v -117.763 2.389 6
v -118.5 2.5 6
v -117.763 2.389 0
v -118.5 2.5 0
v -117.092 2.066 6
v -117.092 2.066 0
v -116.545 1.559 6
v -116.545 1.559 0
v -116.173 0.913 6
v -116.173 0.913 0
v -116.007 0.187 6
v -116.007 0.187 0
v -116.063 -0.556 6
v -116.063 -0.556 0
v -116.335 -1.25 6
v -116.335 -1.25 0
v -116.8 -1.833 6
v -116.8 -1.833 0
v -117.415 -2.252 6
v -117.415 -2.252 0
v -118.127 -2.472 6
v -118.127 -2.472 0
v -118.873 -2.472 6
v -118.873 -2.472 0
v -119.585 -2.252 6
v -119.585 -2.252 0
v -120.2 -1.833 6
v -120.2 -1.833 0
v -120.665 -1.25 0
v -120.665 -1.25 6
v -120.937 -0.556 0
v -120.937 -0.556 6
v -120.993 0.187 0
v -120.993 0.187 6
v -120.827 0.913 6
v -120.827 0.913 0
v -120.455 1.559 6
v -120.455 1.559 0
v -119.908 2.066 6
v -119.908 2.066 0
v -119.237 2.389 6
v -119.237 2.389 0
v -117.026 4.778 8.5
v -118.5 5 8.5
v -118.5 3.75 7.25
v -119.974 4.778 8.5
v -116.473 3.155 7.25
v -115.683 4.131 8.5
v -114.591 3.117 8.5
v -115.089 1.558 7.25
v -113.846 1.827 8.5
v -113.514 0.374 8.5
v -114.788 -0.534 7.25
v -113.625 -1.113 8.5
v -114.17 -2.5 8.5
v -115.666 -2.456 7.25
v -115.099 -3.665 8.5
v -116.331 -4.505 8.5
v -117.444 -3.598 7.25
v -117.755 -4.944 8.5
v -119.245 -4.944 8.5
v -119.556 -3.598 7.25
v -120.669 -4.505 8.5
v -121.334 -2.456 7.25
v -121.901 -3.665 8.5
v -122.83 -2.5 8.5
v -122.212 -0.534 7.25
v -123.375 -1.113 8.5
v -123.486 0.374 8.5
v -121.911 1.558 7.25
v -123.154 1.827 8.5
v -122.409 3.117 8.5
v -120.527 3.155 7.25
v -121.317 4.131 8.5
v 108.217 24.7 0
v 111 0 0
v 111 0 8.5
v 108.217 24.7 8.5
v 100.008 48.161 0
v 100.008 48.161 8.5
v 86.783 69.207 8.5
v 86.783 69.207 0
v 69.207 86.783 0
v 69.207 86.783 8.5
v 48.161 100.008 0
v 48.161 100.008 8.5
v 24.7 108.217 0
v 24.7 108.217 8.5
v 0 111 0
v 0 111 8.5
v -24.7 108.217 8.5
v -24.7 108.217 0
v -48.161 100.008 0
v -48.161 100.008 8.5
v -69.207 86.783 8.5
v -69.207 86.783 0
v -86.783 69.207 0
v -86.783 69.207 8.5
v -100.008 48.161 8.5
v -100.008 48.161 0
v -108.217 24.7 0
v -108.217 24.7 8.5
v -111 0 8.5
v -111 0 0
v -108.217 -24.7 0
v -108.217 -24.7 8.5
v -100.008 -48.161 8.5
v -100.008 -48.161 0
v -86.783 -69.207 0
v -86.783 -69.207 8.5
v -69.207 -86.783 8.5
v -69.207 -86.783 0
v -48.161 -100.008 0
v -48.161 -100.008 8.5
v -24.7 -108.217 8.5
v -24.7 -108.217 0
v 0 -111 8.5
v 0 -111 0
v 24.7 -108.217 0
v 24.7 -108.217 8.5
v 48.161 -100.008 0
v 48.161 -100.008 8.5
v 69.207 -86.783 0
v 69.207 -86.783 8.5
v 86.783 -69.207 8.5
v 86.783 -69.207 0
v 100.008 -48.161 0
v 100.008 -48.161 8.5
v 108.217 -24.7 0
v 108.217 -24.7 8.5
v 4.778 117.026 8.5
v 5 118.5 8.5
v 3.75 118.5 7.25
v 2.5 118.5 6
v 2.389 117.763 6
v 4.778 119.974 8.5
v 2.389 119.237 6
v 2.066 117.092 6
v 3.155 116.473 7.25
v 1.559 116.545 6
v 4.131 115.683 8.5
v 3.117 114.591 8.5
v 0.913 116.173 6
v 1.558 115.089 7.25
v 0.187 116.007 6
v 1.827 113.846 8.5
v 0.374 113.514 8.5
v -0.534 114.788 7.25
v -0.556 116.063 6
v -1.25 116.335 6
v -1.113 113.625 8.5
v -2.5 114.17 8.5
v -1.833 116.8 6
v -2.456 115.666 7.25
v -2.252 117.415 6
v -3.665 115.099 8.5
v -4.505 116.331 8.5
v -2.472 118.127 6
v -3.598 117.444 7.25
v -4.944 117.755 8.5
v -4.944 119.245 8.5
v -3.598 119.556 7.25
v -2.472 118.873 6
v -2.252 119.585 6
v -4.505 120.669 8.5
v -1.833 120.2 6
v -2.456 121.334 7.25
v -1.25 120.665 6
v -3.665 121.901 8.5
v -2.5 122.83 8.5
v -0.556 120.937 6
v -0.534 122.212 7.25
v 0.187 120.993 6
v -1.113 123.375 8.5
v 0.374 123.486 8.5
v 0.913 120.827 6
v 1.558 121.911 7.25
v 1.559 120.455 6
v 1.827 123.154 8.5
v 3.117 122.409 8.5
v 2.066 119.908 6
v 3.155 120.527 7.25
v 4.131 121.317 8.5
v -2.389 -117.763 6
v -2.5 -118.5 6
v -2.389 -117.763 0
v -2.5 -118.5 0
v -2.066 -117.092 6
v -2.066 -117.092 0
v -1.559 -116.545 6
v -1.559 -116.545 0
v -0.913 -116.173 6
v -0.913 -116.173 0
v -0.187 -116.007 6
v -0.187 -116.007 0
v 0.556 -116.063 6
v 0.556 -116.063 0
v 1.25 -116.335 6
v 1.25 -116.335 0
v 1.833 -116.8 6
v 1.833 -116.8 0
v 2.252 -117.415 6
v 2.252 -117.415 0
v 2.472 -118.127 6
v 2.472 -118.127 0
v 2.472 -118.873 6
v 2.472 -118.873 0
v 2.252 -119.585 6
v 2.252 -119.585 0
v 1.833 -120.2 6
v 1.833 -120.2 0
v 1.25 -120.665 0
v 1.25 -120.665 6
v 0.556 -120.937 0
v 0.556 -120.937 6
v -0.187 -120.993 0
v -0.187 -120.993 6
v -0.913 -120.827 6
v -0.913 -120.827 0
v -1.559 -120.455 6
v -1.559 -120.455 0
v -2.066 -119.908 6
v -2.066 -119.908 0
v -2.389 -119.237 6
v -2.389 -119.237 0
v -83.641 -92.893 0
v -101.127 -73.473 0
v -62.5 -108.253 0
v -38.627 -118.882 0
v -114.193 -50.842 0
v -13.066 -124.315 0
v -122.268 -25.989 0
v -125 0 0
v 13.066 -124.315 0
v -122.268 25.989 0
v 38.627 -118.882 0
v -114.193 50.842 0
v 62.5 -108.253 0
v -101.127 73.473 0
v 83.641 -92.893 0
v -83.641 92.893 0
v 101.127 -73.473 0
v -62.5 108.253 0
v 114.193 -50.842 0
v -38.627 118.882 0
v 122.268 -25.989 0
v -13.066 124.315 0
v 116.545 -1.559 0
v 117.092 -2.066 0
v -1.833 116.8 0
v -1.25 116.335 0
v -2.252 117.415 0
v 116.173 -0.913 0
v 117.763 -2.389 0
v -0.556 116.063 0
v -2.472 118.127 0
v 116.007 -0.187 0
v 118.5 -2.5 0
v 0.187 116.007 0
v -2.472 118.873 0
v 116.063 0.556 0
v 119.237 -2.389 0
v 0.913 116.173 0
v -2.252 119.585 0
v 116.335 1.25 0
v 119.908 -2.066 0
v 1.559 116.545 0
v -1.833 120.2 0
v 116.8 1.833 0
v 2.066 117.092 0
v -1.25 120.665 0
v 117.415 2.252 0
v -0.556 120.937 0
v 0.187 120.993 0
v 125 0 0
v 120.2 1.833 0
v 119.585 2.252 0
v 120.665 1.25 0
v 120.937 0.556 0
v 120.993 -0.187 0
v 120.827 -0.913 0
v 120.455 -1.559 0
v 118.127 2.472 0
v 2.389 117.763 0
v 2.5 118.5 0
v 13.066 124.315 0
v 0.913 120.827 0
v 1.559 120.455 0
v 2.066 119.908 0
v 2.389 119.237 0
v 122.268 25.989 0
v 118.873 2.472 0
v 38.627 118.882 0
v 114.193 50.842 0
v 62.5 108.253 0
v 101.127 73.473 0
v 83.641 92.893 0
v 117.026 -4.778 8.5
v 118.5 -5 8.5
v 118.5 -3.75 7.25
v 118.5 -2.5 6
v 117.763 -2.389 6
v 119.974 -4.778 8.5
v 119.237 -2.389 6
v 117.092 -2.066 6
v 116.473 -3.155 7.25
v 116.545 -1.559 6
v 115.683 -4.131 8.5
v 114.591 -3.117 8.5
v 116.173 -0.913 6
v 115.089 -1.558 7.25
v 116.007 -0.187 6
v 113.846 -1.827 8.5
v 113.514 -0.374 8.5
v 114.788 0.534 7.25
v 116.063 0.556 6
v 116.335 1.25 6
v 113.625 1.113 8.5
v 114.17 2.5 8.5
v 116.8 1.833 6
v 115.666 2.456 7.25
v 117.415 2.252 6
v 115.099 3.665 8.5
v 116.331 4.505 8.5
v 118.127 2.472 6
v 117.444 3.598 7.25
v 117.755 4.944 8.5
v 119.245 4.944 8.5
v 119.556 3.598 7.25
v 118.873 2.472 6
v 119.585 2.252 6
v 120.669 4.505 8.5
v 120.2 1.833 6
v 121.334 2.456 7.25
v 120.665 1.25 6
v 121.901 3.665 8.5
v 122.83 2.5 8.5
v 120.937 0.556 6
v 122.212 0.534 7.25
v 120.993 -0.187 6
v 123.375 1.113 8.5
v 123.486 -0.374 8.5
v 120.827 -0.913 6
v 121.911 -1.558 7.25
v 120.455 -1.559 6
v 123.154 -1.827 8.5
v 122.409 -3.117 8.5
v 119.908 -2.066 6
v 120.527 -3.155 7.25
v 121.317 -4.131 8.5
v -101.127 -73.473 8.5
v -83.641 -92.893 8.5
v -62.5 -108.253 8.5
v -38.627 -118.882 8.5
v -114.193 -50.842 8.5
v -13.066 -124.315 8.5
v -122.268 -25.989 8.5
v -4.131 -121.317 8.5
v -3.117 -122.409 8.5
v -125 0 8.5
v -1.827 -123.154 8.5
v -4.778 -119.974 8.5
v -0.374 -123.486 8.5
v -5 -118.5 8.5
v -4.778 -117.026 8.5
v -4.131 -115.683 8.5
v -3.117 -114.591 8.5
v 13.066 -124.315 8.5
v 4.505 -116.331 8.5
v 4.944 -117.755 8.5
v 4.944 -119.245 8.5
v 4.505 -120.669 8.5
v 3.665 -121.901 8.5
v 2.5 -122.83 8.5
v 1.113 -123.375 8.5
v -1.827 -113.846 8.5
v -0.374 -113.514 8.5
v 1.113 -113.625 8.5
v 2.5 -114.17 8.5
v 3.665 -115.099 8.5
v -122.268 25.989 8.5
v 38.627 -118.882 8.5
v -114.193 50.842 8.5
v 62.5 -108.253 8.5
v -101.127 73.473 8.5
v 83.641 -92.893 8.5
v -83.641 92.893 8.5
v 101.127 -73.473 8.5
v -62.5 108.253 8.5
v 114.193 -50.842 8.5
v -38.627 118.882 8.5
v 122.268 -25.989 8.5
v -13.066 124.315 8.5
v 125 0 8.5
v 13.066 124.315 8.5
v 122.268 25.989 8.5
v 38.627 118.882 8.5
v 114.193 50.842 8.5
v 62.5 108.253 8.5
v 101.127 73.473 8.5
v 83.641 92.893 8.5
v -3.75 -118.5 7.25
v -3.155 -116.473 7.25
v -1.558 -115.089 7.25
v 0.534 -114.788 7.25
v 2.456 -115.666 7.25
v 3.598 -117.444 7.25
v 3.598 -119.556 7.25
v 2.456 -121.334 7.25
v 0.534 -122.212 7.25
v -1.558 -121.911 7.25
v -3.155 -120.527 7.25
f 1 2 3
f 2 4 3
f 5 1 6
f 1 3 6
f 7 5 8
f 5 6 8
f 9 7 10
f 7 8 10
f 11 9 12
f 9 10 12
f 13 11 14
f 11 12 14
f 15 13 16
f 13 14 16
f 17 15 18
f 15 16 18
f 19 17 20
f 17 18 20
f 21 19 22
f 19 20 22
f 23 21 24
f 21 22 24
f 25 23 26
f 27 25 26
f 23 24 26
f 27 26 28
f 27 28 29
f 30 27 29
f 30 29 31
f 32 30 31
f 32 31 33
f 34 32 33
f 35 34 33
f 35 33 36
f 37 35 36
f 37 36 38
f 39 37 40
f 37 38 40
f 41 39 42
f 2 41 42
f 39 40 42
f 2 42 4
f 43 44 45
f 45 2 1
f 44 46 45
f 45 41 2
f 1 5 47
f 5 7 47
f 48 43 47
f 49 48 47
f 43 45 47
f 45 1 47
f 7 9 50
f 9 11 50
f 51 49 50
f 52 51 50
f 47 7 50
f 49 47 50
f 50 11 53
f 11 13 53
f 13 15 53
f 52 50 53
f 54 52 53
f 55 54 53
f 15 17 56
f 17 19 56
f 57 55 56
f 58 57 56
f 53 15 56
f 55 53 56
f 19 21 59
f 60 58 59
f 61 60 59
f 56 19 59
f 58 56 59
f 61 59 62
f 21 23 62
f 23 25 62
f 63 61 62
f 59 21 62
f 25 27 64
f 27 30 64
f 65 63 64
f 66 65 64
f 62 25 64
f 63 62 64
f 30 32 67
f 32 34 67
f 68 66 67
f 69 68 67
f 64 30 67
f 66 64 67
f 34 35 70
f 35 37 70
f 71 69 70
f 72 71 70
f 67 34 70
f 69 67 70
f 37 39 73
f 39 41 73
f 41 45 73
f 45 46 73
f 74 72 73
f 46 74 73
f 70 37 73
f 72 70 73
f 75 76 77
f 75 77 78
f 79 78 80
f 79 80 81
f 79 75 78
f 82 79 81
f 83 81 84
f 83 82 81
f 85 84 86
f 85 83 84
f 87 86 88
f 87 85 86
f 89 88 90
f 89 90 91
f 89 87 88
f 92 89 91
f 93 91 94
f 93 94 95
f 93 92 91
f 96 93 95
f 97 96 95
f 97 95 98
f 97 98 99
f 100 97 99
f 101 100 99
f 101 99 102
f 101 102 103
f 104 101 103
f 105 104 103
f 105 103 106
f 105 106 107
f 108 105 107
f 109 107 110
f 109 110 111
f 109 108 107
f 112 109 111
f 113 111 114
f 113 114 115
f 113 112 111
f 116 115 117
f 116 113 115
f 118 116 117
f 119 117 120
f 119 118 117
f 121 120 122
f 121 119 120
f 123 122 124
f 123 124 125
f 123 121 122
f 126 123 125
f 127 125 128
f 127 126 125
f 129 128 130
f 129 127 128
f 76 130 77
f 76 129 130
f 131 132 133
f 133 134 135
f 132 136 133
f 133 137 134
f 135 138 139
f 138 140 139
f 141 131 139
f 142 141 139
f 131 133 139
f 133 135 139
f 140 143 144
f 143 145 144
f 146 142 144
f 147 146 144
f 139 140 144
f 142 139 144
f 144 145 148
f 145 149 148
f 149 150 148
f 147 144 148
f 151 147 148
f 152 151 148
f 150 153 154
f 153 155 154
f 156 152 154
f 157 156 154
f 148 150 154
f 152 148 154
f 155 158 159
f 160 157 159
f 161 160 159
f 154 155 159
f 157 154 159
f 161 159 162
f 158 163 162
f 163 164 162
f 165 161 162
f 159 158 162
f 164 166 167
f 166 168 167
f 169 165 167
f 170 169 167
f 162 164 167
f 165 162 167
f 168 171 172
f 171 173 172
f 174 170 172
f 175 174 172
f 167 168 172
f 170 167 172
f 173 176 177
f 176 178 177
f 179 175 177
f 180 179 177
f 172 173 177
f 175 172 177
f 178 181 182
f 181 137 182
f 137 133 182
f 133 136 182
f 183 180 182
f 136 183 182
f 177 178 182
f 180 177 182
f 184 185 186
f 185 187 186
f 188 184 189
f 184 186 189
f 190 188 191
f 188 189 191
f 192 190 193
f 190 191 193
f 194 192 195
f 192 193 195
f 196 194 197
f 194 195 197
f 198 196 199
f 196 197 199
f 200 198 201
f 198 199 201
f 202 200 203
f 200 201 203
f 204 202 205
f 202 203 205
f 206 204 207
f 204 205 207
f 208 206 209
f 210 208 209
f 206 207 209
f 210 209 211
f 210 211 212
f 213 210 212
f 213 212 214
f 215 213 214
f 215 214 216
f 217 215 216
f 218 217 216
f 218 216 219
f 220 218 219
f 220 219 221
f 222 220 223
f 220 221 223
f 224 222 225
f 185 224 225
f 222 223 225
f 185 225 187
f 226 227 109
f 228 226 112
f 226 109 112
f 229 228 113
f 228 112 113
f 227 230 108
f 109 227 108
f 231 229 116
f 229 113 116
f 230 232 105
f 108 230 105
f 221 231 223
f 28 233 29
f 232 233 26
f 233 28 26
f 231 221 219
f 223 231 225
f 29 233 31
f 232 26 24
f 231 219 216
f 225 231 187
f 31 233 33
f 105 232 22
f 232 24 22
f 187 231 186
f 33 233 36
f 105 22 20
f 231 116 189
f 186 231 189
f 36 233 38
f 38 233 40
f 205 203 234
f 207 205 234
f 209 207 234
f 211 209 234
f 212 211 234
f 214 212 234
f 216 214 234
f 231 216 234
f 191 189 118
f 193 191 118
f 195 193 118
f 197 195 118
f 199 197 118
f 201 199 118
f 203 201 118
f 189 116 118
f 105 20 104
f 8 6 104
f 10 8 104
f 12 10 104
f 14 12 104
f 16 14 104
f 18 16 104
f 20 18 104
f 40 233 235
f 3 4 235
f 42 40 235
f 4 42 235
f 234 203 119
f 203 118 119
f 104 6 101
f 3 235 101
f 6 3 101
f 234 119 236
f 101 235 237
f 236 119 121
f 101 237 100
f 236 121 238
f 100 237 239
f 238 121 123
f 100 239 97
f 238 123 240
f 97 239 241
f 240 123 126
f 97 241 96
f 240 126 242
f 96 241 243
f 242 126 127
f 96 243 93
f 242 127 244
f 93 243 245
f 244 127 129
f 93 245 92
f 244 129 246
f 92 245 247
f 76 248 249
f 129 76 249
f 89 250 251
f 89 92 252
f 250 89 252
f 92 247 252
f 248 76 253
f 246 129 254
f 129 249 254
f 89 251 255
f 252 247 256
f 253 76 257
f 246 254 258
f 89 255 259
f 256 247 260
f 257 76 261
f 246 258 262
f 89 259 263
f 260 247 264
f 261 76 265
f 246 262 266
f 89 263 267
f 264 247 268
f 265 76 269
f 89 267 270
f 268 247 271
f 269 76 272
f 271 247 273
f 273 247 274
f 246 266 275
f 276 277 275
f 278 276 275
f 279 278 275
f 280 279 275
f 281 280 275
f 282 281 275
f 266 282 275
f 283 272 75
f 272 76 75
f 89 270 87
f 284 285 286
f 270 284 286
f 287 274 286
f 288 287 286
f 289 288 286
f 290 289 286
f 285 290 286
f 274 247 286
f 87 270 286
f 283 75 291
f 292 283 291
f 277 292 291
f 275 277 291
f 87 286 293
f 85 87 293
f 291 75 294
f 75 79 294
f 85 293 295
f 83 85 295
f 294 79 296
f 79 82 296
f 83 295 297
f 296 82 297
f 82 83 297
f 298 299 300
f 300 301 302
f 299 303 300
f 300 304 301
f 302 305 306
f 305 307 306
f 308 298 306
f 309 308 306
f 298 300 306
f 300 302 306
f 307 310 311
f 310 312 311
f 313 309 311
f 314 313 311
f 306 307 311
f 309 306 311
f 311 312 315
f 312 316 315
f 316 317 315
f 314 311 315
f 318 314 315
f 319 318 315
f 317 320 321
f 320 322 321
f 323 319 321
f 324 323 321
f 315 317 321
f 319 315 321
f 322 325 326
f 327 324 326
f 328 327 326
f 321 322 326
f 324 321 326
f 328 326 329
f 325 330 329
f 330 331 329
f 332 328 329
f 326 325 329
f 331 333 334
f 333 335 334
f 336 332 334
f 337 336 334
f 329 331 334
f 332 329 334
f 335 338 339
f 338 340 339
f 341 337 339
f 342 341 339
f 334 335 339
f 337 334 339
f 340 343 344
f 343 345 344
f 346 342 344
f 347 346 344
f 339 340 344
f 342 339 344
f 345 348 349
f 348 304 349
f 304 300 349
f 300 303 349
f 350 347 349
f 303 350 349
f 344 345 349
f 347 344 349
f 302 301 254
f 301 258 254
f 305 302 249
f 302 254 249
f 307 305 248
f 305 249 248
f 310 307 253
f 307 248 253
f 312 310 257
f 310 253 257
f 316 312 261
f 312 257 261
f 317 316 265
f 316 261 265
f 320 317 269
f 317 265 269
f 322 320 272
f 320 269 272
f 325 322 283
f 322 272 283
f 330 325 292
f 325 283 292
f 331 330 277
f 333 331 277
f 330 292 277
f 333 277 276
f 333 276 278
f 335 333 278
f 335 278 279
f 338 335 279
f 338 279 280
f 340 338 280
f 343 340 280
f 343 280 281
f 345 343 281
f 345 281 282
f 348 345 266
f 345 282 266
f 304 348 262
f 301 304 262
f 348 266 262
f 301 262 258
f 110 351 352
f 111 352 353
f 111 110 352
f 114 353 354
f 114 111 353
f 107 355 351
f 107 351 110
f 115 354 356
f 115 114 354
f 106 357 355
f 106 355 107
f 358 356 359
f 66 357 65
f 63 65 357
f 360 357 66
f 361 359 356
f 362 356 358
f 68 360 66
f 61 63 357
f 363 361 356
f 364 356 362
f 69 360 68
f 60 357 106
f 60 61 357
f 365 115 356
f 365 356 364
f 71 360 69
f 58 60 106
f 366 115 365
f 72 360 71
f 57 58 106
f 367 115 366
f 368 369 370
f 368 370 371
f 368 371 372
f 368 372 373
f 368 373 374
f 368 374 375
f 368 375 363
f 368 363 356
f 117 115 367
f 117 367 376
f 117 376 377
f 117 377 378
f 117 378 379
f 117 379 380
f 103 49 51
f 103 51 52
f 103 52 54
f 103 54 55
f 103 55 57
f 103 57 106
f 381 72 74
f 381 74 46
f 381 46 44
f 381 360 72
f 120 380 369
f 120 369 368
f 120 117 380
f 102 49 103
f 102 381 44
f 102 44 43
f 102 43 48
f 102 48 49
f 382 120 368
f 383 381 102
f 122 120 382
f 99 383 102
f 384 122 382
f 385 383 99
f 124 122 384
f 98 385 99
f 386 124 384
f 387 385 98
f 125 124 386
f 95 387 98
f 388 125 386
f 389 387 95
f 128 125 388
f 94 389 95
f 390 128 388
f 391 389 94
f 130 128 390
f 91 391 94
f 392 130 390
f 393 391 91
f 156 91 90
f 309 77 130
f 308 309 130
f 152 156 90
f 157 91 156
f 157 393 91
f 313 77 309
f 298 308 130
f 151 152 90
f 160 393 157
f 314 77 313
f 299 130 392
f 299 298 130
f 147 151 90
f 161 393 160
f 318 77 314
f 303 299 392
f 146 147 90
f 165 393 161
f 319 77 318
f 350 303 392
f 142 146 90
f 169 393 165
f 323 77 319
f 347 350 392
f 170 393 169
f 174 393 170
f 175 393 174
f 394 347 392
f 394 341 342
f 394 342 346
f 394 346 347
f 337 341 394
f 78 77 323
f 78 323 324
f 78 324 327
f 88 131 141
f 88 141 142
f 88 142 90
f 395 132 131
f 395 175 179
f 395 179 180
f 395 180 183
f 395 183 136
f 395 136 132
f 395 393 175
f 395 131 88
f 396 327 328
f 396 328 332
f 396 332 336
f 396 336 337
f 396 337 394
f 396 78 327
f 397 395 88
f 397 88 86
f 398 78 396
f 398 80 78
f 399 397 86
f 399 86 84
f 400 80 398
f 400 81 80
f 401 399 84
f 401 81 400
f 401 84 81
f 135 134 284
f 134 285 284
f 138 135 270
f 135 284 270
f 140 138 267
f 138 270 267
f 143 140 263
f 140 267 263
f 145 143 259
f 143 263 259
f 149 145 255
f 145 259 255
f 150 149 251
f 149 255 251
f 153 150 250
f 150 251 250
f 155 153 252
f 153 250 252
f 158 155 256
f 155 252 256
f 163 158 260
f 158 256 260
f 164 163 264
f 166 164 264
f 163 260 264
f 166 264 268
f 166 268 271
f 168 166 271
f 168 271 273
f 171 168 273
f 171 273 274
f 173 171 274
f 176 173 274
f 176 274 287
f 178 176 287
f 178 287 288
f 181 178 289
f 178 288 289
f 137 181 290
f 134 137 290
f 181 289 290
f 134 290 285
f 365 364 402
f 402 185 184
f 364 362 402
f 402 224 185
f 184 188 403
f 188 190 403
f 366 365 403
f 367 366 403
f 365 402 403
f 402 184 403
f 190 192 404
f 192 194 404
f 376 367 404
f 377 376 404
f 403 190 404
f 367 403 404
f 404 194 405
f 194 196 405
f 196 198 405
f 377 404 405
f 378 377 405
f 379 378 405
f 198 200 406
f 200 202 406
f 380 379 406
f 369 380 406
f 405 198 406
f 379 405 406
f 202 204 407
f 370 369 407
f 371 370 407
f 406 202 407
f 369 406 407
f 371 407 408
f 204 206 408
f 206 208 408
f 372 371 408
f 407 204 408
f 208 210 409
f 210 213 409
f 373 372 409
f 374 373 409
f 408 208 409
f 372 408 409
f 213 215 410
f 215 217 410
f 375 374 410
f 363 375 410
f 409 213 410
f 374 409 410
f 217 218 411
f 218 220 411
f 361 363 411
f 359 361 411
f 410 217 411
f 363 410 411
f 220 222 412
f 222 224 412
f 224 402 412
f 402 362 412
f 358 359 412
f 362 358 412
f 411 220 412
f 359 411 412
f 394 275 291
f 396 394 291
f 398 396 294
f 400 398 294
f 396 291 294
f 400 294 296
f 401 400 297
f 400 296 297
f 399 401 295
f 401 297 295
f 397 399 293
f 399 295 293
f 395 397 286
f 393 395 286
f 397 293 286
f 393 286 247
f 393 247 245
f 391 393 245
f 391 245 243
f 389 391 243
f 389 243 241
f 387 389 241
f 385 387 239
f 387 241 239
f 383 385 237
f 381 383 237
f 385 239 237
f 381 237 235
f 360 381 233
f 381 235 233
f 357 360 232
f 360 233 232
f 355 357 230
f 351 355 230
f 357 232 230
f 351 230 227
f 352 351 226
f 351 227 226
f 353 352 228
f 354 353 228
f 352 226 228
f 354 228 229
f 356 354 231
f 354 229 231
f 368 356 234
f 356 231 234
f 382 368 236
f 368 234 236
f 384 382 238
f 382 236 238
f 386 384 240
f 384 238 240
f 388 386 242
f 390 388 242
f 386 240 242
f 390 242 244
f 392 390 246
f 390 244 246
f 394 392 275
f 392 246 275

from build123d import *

# Parameters (mm, degrees)
SCHIZZO1_R                                           = 125
SCHIZZO1_R_2                                         = 111
ESTRUSIONE_ESTRUSIONE1_DEPTH                         = 8.5
FORO_SVASATO_PER_VITE_M4_A_TESTA_SVASATA_D           = 5
FORO_SVASATO_PER_VITE_M4_A_TESTA_SVASATA_CSINK_D     = 10
FORO_SVASATO_PER_VITE_M4_A_TESTA_SVASATA_CSINK_ANGLE = 90
RIPETIZIONECIRCOLARE1_COUNT                          = 4


with BuildPart() as part:
    # Schizzo1 → Estrusione-Estrusione1 (new body)
    with BuildSketch(Plane.XY):
        Circle(SCHIZZO1_R)
        Circle(SCHIZZO1_R_2, mode=Mode.SUBTRACT)
    extrude(amount=ESTRUSIONE_ESTRUSIONE1_DEPTH)

    # Foro svasato per Vite M4 a testa svasata cilindrica2 (through all)
    with Locations(Plane.XY.offset(8.5)):
        with Locations((0, -118.5)):
            foro_svasato_per_vite_m4_a_testa_svasata = CounterSinkHole(FORO_SVASATO_PER_VITE_M4_A_TESTA_SVASATA_D / 2, FORO_SVASATO_PER_VITE_M4_A_TESTA_SVASATA_CSINK_D / 2, counter_sink_angle=FORO_SVASATO_PER_VITE_M4_A_TESTA_SVASATA_CSINK_ANGLE)

    # RipetizioneCircolare1: Foro svasato per Vite M4 a testa svasata cilindrica2 ×4 about axis
    ripetizionecircolare1_axis = Axis((0, 0, 0), (0, 0, 1))
    for i in range(1, RIPETIZIONECIRCOLARE1_COUNT):
        add(foro_svasato_per_vite_m4_a_testa_svasata.rotate(ripetizionecircolare1_axis, i * 360 / RIPETIZIONECIRCOLARE1_COUNT), mode=Mode.SUBTRACT)


solid = part.part
